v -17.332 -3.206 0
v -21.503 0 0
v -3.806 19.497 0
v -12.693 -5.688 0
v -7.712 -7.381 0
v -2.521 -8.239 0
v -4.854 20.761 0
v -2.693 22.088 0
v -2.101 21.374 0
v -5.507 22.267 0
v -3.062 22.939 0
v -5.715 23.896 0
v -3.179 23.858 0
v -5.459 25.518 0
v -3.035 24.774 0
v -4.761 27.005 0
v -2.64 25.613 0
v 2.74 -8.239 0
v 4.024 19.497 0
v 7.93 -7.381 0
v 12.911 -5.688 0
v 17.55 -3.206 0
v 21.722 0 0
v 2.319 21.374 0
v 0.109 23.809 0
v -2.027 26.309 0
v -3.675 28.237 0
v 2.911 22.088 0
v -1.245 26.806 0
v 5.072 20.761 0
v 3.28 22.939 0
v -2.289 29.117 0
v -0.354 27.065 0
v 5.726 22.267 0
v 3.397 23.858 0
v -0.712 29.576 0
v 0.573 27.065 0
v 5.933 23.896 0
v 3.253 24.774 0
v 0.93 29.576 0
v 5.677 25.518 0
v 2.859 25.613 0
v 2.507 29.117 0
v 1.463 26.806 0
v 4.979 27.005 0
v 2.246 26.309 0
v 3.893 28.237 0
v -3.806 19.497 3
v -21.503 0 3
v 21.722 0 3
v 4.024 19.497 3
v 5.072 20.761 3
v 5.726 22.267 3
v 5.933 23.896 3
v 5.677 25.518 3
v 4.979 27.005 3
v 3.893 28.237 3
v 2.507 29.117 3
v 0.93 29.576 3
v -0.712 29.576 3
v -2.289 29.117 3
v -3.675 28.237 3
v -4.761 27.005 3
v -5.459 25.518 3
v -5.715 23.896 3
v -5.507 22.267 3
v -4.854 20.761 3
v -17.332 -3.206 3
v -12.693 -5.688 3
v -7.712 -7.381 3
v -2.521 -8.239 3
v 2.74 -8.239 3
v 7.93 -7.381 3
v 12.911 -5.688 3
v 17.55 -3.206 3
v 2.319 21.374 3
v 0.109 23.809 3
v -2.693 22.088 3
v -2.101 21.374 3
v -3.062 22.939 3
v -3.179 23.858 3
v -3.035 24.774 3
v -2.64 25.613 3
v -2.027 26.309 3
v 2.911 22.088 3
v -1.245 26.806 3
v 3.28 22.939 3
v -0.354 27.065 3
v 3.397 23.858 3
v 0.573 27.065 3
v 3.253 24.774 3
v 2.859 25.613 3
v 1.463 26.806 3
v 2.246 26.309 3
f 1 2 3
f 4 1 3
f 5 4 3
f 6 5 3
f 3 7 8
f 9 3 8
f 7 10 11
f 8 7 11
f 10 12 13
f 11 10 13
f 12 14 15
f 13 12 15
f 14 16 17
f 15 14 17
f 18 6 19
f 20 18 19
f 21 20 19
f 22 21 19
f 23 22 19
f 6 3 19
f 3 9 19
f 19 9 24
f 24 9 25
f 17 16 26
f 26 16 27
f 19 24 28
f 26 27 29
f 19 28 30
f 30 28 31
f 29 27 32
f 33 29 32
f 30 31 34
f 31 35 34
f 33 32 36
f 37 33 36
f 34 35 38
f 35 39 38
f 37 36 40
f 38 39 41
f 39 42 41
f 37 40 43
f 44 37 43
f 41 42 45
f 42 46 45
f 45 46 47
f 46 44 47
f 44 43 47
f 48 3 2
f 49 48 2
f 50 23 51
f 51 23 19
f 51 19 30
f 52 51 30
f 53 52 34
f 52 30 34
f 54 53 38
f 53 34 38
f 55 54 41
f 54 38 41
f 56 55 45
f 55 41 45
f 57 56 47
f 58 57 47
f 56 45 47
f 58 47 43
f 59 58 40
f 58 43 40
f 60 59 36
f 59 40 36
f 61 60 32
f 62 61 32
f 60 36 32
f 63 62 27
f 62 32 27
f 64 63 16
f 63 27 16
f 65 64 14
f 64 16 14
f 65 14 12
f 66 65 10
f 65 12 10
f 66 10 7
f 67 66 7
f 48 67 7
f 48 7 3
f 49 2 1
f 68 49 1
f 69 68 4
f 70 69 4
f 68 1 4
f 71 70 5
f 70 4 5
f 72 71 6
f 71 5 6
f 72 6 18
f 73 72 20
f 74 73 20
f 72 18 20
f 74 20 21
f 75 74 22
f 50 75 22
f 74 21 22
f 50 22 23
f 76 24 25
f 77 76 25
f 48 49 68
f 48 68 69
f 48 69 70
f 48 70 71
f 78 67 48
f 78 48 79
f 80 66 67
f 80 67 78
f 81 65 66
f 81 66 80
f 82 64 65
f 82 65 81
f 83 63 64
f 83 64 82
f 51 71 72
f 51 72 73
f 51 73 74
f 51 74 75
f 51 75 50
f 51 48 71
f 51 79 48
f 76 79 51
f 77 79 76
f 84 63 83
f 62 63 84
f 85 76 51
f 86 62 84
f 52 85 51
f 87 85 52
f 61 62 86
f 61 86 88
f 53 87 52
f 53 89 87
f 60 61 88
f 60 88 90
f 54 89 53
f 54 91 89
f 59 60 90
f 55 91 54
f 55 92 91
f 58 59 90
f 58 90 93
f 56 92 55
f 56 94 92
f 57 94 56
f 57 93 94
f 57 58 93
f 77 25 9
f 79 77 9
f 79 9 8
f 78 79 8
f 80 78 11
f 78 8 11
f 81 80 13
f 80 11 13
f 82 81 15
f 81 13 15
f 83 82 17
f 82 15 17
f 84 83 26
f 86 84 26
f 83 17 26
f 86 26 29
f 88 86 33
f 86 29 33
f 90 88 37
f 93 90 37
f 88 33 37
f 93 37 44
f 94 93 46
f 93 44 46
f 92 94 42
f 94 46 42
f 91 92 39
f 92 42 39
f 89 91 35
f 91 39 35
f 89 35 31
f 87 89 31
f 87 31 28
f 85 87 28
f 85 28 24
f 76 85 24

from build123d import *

# Parameters (mm, degrees)
F1_DEPTH = 3
F6_DEPTH = 3


# Not quite as in the source:
# - the program builds the solid bodies; features that only make, move or delete a surface that nothing else refers to are left out


with BuildPart() as f1:
    # F0 (on Top) → F1 (new body)
    with BuildSketch(Plane.XY):
        with BuildLine():
            Line((-3.8056071322, 19.4965880074), (-21.5033702552, 0))
            ThreePointArc((-21.5033702552, 0), (0.1091537997, -8.3463338313), (21.7216778547, 0))
            Line((21.7216778547, 0), (4.0239147316, 19.4965880074))
            Line((4.0239147316, 19.4965880074), (2.3194467965, 21.374300398))
            Line((2.3194467965, 21.374300398), (0.1091537997, 23.8092506024))
            Line((0.1091537997, 23.8092506024), (-2.1011391971, 21.374300398))
            Line((-2.1011391971, 21.374300398), (-3.8056071322, 19.4965880074))
        make_face()
        with BuildLine():
            Line((-15.8273540437, 0), (0.1091537997, 23.8092506024))
            Line((0.1091537997, 23.8092506024), (16.0456616431, 0))
            ThreePointArc((16.0456616431, 0), (0.1091537997, -4.8412763821), (-15.8273540437, 0))
        make_face(mode=Mode.SUBTRACT)
        with BuildLine():
            Line((16.0456616431, 0), (0.1091537997, 23.8092506024))
            Line((0.1091537997, 23.8092506024), (-15.8273540437, 0))
            ThreePointArc((-15.8273540437, 0), (0.1091537997, -4.8412763821), (16.0456616431, 0))
        make_face()
        with BuildLine():
            Line((-10.592116043, 0), (0.1091537997, 23.8092506024))
            Line((0.1091537997, 23.8092506024), (11.3627482206, 0))
            ThreePointArc((11.3627482206, 0), (0.3853160888, -2.256488537), (-10.592116043, 0))
        make_face(mode=Mode.SUBTRACT)
        with BuildLine():
            Line((11.3627482206, 0), (0.1091537997, 23.8092506024))
            Line((0.1091537997, 23.8092506024), (-10.592116043, 0))
            ThreePointArc((-10.592116043, 0), (0.3853160888, -2.256488537), (11.3627482206, 0))
        make_face()
    extrude(amount=F1_DEPTH)

    # F0 (on Top) → F6 (join)
    with BuildSketch(Plane.XY):
        with BuildLine():
            ThreePointArc((4.0239147316, 19.4965880074), (0.1091537997, 29.6337172572), (-3.8056071322, 19.4965880074))
            Line((-3.8056071322, 19.4965880074), (-2.1011391971, 21.374300398))
            ThreePointArc((-2.1011391971, 21.374300398), (0.1091537997, 27.0977727066), (2.3194467965, 21.374300398))
            Line((2.3194467965, 21.374300398), (4.0239147316, 19.4965880074))
        make_face()
    extrude(amount=F6_DEPTH)


solid = f1.part
